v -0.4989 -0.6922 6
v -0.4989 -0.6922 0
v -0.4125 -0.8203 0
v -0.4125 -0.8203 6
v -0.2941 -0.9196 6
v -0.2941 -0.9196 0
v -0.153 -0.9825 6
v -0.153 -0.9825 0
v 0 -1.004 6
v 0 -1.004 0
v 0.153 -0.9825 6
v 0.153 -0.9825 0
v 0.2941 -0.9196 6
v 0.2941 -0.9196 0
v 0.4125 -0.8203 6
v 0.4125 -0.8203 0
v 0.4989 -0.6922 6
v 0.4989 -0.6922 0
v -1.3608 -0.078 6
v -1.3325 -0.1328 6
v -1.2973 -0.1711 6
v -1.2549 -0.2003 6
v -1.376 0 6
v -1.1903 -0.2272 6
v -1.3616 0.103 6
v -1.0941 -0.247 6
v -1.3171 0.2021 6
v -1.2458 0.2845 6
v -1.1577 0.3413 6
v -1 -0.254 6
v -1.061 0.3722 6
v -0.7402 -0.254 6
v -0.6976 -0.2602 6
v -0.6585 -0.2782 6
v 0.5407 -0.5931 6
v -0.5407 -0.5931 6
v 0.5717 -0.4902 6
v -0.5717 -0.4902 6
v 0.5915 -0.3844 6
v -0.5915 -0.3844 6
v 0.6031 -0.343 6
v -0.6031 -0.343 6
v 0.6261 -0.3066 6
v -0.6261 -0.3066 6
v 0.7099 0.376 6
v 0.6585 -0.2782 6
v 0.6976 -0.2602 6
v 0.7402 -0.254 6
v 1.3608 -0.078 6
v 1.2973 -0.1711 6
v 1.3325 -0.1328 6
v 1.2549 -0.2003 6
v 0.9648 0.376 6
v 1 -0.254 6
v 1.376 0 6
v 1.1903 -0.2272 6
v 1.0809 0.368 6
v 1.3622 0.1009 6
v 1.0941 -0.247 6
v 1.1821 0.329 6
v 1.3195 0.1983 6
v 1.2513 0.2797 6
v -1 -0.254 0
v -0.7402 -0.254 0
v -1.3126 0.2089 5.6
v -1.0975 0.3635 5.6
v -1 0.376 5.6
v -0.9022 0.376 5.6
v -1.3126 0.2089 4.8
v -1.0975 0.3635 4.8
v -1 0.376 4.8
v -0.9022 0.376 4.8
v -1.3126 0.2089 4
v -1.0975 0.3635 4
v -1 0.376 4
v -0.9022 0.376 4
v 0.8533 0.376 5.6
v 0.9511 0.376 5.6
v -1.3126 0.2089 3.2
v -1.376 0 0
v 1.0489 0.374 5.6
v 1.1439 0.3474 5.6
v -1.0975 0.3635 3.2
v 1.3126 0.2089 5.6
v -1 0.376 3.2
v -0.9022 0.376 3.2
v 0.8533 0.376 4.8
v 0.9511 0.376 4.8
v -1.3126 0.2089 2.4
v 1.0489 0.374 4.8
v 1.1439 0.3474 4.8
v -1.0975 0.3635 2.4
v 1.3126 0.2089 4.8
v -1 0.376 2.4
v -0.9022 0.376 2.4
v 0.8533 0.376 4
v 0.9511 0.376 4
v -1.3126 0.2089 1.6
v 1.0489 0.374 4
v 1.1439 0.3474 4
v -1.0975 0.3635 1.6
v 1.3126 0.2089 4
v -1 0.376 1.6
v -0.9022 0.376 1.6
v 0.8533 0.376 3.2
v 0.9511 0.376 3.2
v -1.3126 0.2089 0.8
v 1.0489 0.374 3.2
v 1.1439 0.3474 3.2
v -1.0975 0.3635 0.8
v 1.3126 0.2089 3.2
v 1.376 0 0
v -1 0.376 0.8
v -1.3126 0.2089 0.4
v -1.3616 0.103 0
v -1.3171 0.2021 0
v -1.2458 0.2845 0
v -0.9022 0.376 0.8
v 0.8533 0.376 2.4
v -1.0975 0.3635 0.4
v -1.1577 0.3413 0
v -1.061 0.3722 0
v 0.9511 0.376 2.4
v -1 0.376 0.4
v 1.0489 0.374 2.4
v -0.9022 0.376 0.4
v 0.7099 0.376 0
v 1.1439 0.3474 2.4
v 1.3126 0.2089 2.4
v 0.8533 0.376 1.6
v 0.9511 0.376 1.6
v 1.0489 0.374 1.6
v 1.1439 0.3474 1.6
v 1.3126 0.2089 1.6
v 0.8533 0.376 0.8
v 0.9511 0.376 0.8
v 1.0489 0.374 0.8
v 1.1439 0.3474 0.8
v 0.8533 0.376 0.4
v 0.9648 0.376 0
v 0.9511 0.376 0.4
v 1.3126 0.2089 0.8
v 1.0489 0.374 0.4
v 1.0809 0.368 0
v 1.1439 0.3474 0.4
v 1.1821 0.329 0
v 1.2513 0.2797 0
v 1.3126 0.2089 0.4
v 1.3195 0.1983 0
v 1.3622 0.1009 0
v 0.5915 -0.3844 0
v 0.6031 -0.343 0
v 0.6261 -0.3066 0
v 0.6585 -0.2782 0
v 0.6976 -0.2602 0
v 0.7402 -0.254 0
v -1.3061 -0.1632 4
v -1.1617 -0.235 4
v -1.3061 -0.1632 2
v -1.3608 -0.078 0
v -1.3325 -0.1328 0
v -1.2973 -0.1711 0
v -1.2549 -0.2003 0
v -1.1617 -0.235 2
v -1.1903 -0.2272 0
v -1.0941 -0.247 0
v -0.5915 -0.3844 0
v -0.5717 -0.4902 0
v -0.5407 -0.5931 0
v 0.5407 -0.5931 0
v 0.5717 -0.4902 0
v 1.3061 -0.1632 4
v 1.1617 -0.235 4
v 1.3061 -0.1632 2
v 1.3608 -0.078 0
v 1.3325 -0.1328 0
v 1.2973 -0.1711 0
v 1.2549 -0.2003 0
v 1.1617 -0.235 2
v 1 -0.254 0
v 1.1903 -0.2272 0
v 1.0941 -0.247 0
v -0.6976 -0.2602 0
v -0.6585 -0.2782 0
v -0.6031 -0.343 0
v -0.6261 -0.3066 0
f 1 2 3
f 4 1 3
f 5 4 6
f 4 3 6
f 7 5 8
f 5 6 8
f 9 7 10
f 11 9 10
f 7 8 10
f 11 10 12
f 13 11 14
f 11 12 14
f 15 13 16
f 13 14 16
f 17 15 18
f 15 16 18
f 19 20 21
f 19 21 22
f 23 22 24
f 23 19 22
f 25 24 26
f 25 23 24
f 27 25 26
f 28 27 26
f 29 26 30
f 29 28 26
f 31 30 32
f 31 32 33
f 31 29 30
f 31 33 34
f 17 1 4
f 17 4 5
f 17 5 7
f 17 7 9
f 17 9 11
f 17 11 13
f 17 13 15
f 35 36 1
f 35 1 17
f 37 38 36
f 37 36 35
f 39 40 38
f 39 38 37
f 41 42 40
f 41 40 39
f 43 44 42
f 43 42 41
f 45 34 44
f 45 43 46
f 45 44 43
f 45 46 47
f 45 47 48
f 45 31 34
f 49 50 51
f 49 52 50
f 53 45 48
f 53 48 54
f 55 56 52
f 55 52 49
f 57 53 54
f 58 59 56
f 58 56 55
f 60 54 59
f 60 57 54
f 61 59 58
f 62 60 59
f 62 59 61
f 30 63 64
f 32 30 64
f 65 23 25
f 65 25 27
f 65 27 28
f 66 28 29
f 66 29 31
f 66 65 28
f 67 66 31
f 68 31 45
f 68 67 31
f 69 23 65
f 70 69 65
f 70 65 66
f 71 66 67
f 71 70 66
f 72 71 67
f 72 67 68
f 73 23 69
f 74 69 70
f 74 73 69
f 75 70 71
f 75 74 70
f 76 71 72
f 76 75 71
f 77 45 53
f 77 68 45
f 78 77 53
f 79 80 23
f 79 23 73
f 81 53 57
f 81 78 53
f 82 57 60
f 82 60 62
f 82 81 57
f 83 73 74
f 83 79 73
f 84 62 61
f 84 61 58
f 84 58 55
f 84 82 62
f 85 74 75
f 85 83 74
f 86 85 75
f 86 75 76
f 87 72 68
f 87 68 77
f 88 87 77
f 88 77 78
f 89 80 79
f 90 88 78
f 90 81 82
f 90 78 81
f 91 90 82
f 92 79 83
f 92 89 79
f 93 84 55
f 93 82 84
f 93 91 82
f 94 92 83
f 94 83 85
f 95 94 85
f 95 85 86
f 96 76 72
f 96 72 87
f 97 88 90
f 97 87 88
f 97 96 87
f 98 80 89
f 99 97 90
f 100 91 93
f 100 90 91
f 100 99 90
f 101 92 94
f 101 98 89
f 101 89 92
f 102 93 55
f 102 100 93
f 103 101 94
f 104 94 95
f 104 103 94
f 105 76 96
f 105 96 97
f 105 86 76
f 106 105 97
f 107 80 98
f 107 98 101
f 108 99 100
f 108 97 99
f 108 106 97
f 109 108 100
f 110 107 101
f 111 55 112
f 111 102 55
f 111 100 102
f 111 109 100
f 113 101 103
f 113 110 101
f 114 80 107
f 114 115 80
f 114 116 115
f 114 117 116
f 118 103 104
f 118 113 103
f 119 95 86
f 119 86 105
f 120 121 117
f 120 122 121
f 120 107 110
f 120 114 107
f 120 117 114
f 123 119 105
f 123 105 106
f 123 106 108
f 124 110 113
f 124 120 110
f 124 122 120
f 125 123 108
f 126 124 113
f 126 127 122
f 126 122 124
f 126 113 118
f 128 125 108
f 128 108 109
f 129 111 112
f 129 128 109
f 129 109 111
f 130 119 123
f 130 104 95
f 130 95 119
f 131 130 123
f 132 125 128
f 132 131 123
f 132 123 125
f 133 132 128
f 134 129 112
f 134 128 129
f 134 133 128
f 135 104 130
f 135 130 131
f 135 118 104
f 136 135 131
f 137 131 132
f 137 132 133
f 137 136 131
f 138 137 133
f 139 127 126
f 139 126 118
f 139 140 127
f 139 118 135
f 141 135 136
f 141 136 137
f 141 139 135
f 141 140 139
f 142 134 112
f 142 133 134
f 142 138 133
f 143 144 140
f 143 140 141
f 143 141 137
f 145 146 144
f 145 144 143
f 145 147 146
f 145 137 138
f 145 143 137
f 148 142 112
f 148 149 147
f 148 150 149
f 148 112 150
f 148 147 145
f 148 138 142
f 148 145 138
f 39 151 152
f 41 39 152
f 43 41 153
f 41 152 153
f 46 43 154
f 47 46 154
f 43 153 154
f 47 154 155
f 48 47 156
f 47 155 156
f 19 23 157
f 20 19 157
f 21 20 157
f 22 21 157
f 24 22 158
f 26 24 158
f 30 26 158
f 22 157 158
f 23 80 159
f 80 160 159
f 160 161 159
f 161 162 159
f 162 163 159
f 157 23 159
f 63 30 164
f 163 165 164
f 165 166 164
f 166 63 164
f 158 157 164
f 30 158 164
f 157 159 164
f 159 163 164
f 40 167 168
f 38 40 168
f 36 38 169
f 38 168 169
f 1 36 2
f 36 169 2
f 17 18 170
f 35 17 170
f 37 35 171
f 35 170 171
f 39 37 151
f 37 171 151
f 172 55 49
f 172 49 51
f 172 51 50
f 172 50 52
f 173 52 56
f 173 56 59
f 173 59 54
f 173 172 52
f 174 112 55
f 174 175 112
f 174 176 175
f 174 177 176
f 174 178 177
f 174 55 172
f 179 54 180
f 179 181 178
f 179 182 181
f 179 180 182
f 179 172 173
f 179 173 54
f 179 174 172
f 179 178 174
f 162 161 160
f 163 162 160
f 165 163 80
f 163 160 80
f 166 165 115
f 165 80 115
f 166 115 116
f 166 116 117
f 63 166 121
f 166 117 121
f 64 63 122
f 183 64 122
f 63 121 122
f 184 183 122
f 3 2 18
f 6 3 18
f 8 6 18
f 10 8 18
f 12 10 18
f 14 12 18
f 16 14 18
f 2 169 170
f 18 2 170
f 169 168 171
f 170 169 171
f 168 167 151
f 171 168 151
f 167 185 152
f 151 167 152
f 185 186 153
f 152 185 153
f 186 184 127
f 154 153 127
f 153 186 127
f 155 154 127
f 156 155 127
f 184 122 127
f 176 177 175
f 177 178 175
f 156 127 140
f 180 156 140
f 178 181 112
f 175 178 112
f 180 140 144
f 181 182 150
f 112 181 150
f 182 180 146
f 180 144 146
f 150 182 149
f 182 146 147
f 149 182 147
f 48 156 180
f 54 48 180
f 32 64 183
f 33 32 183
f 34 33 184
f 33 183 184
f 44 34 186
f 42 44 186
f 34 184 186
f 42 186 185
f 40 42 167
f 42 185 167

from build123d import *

# Parameters (mm, degrees)
BOSS_EXTRUDE1_DEPTH = 6


with BuildPart() as part:
    # Sketch1 → Boss-Extrude1 (new body)
    with BuildSketch(Plane.XY):
        with BuildLine():
            Line((-1, -0.254), (-0.740175425, -0.254))
            ThreePointArc((-0.740175425, -0.254), (-0.641268354, -0.291228588), (-0.591456891, -0.384434783))
            ThreePointArc((-0.591456891, -0.384434783), (-0.557611714, -0.542062154), (-0.498876404, -0.692202247))
            ThreePointArc((-0.498876404, -0.692202247), (0, -1.004), (0.498876404, -0.692202247))
            ThreePointArc((0.498876404, -0.692202247), (0.557611714, -0.542062154), (0.591456891, -0.384434783))
            ThreePointArc((0.591456891, -0.384434783), (0.641268354, -0.291228588), (0.740175425, -0.254))
            Line((0.740175425, -0.254), (1, -0.254))
            add(Edge.make_bspline(
                [(1.376, 0), (1.362302216, -0.221622552), (1.151418555, -0.248602833), (1, -0.254)],
                knots=[0, 0, 0, 0, 1, 1, 1, 1], degree=3))
            add(Edge.make_bspline(
                [(-1.376, 0), (-1.376, 0.156890105), (-1.288836528, 0.28733946), (-1.143888971, 0.347378704), (-1.128828921, 0.353616781), (-1.097897496, 0.364134221), (-1.048902641, 0.376), (-1.01630088, 0.376), (-1, 0.376), (-0.98369912, 0.376), (-0.951097359, 0.376), (-0.902194719, 0.376), (-0.869592958, 0.376), (-0.853292078, 0.376), (-0.284430693, 0.376), (0.284430693, 0.376), (0.853292078, 0.376), (0.869592958, 0.376), (0.902194719, 0.376), (0.951097359, 0.376), (0.98369912, 0.376), (1, 0.376), (1.01630088, 0.376), (1.048902641, 0.376), (1.097897496, 0.364134221), (1.128828921, 0.353616781), (1.143888971, 0.347378704), (1.288836528, 0.28733946), (1.376, 0.156890105), (1.376, 0)],
                knots=[0, 0, 0, 0, 0.133521792, 0.133521792, 0.133521792, 0.149150664, 0.164779537, 0.18040841, 0.18040841, 0.18040841, 0.196037283, 0.211666155, 0.227295028, 0.227295028, 0.227295028, 0.772704972, 0.772704972, 0.772704972, 0.788333845, 0.803962717, 0.81959159, 0.81959159, 0.81959159, 0.835220463, 0.850849336, 0.866478208, 0.866478208, 0.866478208, 1, 1, 1, 1], degree=3, weights=[1, 0.887646408, 0.887646408, 1, 1, 1, 1, 1, 1, 1, 1, 1, 1, 1, 1, 1, 1, 1, 1, 1, 1, 1, 1, 1, 1, 1, 1, 0.887646408, 0.887646408, 1]))
            add(Edge.make_bspline(
                [(-1.376, 0), (-1.362302216, -0.221622552), (-1.151418555, -0.248602833), (-1, -0.254)],
                knots=[0, 0, 0, 0, 1, 1, 1, 1], degree=3))
        make_face()
    extrude(amount=BOSS_EXTRUDE1_DEPTH)


solid = part.part
